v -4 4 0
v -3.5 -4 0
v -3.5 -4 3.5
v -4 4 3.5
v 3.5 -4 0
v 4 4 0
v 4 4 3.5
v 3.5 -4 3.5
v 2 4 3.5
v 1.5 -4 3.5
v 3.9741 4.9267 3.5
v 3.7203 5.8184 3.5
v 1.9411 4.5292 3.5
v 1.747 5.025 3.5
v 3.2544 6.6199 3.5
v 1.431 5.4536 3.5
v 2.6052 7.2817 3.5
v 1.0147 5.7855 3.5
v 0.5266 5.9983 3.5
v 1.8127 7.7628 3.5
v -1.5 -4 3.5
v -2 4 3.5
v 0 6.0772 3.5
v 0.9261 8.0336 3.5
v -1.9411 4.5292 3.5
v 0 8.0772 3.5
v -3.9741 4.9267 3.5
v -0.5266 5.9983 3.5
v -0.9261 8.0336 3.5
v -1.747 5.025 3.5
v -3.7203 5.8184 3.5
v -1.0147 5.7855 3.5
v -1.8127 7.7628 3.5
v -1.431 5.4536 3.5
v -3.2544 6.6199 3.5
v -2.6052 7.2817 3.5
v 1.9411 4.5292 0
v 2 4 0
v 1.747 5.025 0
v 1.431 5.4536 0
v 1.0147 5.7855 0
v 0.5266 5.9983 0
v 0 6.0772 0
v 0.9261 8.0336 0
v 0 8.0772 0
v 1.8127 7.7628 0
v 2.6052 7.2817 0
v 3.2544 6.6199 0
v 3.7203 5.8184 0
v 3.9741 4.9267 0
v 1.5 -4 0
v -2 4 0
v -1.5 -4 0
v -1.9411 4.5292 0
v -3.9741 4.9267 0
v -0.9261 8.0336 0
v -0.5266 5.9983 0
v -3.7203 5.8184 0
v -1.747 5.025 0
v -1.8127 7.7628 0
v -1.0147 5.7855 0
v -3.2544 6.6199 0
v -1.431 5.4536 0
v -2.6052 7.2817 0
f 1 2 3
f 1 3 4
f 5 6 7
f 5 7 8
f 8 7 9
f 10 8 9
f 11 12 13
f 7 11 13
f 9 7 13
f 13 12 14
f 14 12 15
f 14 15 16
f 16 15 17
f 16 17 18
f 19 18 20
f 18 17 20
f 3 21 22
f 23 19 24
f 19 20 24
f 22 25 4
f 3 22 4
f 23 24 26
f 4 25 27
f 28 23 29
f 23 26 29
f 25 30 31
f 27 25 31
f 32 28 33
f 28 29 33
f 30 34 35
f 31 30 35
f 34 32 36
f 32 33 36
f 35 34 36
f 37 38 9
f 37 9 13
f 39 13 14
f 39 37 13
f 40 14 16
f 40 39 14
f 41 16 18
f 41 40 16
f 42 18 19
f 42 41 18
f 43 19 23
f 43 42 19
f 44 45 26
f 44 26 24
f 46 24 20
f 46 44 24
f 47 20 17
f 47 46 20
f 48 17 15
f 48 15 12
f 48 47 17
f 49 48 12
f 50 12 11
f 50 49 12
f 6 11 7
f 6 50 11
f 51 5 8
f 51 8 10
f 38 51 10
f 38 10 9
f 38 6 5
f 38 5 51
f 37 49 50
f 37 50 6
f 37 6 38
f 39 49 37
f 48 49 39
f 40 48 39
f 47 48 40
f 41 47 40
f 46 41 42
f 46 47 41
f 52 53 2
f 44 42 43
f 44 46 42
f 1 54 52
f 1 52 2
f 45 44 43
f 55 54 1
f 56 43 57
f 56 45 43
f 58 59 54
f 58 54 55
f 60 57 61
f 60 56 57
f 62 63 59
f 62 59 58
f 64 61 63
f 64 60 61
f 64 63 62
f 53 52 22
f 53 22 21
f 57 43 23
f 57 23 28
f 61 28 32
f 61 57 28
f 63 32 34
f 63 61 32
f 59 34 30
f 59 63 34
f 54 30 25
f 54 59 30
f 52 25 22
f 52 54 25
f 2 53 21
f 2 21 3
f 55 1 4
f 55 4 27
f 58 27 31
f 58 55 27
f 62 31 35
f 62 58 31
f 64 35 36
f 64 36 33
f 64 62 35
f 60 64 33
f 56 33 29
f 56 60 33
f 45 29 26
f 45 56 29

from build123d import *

# Parameters (mm, degrees)
BOSS_EXTRUDE1_DEPTH = 3.5


with BuildPart() as part:
    # Sketch1 → Boss-Extrude1 (new body)
    with BuildSketch(Plane.XY):
        with BuildLine():
            Line((-2, 4), (-1.5, -4))
            Line((-1.5, -4), (-3.5, -4))
            Line((-3.5, -4), (-4, 4))
            ThreePointArc((-4, 4), (-2.950434096, 6.97104187), (0, 8.077214108))
            ThreePointArc((0, 8.077214108), (2.950434096, 6.97104187), (4, 4))
            Line((4, 4), (3.5, -4))
            Line((3.5, -4), (1.5, -4))
            Line((1.5, -4), (2, 4))
            ThreePointArc((2, 4), (1.430965913, 5.453553122), (0, 6.077214108))
            ThreePointArc((0, 6.077214108), (-1.430965913, 5.453553122), (-2, 4))
        make_face()
    extrude(amount=BOSS_EXTRUDE1_DEPTH)


solid = part.part
